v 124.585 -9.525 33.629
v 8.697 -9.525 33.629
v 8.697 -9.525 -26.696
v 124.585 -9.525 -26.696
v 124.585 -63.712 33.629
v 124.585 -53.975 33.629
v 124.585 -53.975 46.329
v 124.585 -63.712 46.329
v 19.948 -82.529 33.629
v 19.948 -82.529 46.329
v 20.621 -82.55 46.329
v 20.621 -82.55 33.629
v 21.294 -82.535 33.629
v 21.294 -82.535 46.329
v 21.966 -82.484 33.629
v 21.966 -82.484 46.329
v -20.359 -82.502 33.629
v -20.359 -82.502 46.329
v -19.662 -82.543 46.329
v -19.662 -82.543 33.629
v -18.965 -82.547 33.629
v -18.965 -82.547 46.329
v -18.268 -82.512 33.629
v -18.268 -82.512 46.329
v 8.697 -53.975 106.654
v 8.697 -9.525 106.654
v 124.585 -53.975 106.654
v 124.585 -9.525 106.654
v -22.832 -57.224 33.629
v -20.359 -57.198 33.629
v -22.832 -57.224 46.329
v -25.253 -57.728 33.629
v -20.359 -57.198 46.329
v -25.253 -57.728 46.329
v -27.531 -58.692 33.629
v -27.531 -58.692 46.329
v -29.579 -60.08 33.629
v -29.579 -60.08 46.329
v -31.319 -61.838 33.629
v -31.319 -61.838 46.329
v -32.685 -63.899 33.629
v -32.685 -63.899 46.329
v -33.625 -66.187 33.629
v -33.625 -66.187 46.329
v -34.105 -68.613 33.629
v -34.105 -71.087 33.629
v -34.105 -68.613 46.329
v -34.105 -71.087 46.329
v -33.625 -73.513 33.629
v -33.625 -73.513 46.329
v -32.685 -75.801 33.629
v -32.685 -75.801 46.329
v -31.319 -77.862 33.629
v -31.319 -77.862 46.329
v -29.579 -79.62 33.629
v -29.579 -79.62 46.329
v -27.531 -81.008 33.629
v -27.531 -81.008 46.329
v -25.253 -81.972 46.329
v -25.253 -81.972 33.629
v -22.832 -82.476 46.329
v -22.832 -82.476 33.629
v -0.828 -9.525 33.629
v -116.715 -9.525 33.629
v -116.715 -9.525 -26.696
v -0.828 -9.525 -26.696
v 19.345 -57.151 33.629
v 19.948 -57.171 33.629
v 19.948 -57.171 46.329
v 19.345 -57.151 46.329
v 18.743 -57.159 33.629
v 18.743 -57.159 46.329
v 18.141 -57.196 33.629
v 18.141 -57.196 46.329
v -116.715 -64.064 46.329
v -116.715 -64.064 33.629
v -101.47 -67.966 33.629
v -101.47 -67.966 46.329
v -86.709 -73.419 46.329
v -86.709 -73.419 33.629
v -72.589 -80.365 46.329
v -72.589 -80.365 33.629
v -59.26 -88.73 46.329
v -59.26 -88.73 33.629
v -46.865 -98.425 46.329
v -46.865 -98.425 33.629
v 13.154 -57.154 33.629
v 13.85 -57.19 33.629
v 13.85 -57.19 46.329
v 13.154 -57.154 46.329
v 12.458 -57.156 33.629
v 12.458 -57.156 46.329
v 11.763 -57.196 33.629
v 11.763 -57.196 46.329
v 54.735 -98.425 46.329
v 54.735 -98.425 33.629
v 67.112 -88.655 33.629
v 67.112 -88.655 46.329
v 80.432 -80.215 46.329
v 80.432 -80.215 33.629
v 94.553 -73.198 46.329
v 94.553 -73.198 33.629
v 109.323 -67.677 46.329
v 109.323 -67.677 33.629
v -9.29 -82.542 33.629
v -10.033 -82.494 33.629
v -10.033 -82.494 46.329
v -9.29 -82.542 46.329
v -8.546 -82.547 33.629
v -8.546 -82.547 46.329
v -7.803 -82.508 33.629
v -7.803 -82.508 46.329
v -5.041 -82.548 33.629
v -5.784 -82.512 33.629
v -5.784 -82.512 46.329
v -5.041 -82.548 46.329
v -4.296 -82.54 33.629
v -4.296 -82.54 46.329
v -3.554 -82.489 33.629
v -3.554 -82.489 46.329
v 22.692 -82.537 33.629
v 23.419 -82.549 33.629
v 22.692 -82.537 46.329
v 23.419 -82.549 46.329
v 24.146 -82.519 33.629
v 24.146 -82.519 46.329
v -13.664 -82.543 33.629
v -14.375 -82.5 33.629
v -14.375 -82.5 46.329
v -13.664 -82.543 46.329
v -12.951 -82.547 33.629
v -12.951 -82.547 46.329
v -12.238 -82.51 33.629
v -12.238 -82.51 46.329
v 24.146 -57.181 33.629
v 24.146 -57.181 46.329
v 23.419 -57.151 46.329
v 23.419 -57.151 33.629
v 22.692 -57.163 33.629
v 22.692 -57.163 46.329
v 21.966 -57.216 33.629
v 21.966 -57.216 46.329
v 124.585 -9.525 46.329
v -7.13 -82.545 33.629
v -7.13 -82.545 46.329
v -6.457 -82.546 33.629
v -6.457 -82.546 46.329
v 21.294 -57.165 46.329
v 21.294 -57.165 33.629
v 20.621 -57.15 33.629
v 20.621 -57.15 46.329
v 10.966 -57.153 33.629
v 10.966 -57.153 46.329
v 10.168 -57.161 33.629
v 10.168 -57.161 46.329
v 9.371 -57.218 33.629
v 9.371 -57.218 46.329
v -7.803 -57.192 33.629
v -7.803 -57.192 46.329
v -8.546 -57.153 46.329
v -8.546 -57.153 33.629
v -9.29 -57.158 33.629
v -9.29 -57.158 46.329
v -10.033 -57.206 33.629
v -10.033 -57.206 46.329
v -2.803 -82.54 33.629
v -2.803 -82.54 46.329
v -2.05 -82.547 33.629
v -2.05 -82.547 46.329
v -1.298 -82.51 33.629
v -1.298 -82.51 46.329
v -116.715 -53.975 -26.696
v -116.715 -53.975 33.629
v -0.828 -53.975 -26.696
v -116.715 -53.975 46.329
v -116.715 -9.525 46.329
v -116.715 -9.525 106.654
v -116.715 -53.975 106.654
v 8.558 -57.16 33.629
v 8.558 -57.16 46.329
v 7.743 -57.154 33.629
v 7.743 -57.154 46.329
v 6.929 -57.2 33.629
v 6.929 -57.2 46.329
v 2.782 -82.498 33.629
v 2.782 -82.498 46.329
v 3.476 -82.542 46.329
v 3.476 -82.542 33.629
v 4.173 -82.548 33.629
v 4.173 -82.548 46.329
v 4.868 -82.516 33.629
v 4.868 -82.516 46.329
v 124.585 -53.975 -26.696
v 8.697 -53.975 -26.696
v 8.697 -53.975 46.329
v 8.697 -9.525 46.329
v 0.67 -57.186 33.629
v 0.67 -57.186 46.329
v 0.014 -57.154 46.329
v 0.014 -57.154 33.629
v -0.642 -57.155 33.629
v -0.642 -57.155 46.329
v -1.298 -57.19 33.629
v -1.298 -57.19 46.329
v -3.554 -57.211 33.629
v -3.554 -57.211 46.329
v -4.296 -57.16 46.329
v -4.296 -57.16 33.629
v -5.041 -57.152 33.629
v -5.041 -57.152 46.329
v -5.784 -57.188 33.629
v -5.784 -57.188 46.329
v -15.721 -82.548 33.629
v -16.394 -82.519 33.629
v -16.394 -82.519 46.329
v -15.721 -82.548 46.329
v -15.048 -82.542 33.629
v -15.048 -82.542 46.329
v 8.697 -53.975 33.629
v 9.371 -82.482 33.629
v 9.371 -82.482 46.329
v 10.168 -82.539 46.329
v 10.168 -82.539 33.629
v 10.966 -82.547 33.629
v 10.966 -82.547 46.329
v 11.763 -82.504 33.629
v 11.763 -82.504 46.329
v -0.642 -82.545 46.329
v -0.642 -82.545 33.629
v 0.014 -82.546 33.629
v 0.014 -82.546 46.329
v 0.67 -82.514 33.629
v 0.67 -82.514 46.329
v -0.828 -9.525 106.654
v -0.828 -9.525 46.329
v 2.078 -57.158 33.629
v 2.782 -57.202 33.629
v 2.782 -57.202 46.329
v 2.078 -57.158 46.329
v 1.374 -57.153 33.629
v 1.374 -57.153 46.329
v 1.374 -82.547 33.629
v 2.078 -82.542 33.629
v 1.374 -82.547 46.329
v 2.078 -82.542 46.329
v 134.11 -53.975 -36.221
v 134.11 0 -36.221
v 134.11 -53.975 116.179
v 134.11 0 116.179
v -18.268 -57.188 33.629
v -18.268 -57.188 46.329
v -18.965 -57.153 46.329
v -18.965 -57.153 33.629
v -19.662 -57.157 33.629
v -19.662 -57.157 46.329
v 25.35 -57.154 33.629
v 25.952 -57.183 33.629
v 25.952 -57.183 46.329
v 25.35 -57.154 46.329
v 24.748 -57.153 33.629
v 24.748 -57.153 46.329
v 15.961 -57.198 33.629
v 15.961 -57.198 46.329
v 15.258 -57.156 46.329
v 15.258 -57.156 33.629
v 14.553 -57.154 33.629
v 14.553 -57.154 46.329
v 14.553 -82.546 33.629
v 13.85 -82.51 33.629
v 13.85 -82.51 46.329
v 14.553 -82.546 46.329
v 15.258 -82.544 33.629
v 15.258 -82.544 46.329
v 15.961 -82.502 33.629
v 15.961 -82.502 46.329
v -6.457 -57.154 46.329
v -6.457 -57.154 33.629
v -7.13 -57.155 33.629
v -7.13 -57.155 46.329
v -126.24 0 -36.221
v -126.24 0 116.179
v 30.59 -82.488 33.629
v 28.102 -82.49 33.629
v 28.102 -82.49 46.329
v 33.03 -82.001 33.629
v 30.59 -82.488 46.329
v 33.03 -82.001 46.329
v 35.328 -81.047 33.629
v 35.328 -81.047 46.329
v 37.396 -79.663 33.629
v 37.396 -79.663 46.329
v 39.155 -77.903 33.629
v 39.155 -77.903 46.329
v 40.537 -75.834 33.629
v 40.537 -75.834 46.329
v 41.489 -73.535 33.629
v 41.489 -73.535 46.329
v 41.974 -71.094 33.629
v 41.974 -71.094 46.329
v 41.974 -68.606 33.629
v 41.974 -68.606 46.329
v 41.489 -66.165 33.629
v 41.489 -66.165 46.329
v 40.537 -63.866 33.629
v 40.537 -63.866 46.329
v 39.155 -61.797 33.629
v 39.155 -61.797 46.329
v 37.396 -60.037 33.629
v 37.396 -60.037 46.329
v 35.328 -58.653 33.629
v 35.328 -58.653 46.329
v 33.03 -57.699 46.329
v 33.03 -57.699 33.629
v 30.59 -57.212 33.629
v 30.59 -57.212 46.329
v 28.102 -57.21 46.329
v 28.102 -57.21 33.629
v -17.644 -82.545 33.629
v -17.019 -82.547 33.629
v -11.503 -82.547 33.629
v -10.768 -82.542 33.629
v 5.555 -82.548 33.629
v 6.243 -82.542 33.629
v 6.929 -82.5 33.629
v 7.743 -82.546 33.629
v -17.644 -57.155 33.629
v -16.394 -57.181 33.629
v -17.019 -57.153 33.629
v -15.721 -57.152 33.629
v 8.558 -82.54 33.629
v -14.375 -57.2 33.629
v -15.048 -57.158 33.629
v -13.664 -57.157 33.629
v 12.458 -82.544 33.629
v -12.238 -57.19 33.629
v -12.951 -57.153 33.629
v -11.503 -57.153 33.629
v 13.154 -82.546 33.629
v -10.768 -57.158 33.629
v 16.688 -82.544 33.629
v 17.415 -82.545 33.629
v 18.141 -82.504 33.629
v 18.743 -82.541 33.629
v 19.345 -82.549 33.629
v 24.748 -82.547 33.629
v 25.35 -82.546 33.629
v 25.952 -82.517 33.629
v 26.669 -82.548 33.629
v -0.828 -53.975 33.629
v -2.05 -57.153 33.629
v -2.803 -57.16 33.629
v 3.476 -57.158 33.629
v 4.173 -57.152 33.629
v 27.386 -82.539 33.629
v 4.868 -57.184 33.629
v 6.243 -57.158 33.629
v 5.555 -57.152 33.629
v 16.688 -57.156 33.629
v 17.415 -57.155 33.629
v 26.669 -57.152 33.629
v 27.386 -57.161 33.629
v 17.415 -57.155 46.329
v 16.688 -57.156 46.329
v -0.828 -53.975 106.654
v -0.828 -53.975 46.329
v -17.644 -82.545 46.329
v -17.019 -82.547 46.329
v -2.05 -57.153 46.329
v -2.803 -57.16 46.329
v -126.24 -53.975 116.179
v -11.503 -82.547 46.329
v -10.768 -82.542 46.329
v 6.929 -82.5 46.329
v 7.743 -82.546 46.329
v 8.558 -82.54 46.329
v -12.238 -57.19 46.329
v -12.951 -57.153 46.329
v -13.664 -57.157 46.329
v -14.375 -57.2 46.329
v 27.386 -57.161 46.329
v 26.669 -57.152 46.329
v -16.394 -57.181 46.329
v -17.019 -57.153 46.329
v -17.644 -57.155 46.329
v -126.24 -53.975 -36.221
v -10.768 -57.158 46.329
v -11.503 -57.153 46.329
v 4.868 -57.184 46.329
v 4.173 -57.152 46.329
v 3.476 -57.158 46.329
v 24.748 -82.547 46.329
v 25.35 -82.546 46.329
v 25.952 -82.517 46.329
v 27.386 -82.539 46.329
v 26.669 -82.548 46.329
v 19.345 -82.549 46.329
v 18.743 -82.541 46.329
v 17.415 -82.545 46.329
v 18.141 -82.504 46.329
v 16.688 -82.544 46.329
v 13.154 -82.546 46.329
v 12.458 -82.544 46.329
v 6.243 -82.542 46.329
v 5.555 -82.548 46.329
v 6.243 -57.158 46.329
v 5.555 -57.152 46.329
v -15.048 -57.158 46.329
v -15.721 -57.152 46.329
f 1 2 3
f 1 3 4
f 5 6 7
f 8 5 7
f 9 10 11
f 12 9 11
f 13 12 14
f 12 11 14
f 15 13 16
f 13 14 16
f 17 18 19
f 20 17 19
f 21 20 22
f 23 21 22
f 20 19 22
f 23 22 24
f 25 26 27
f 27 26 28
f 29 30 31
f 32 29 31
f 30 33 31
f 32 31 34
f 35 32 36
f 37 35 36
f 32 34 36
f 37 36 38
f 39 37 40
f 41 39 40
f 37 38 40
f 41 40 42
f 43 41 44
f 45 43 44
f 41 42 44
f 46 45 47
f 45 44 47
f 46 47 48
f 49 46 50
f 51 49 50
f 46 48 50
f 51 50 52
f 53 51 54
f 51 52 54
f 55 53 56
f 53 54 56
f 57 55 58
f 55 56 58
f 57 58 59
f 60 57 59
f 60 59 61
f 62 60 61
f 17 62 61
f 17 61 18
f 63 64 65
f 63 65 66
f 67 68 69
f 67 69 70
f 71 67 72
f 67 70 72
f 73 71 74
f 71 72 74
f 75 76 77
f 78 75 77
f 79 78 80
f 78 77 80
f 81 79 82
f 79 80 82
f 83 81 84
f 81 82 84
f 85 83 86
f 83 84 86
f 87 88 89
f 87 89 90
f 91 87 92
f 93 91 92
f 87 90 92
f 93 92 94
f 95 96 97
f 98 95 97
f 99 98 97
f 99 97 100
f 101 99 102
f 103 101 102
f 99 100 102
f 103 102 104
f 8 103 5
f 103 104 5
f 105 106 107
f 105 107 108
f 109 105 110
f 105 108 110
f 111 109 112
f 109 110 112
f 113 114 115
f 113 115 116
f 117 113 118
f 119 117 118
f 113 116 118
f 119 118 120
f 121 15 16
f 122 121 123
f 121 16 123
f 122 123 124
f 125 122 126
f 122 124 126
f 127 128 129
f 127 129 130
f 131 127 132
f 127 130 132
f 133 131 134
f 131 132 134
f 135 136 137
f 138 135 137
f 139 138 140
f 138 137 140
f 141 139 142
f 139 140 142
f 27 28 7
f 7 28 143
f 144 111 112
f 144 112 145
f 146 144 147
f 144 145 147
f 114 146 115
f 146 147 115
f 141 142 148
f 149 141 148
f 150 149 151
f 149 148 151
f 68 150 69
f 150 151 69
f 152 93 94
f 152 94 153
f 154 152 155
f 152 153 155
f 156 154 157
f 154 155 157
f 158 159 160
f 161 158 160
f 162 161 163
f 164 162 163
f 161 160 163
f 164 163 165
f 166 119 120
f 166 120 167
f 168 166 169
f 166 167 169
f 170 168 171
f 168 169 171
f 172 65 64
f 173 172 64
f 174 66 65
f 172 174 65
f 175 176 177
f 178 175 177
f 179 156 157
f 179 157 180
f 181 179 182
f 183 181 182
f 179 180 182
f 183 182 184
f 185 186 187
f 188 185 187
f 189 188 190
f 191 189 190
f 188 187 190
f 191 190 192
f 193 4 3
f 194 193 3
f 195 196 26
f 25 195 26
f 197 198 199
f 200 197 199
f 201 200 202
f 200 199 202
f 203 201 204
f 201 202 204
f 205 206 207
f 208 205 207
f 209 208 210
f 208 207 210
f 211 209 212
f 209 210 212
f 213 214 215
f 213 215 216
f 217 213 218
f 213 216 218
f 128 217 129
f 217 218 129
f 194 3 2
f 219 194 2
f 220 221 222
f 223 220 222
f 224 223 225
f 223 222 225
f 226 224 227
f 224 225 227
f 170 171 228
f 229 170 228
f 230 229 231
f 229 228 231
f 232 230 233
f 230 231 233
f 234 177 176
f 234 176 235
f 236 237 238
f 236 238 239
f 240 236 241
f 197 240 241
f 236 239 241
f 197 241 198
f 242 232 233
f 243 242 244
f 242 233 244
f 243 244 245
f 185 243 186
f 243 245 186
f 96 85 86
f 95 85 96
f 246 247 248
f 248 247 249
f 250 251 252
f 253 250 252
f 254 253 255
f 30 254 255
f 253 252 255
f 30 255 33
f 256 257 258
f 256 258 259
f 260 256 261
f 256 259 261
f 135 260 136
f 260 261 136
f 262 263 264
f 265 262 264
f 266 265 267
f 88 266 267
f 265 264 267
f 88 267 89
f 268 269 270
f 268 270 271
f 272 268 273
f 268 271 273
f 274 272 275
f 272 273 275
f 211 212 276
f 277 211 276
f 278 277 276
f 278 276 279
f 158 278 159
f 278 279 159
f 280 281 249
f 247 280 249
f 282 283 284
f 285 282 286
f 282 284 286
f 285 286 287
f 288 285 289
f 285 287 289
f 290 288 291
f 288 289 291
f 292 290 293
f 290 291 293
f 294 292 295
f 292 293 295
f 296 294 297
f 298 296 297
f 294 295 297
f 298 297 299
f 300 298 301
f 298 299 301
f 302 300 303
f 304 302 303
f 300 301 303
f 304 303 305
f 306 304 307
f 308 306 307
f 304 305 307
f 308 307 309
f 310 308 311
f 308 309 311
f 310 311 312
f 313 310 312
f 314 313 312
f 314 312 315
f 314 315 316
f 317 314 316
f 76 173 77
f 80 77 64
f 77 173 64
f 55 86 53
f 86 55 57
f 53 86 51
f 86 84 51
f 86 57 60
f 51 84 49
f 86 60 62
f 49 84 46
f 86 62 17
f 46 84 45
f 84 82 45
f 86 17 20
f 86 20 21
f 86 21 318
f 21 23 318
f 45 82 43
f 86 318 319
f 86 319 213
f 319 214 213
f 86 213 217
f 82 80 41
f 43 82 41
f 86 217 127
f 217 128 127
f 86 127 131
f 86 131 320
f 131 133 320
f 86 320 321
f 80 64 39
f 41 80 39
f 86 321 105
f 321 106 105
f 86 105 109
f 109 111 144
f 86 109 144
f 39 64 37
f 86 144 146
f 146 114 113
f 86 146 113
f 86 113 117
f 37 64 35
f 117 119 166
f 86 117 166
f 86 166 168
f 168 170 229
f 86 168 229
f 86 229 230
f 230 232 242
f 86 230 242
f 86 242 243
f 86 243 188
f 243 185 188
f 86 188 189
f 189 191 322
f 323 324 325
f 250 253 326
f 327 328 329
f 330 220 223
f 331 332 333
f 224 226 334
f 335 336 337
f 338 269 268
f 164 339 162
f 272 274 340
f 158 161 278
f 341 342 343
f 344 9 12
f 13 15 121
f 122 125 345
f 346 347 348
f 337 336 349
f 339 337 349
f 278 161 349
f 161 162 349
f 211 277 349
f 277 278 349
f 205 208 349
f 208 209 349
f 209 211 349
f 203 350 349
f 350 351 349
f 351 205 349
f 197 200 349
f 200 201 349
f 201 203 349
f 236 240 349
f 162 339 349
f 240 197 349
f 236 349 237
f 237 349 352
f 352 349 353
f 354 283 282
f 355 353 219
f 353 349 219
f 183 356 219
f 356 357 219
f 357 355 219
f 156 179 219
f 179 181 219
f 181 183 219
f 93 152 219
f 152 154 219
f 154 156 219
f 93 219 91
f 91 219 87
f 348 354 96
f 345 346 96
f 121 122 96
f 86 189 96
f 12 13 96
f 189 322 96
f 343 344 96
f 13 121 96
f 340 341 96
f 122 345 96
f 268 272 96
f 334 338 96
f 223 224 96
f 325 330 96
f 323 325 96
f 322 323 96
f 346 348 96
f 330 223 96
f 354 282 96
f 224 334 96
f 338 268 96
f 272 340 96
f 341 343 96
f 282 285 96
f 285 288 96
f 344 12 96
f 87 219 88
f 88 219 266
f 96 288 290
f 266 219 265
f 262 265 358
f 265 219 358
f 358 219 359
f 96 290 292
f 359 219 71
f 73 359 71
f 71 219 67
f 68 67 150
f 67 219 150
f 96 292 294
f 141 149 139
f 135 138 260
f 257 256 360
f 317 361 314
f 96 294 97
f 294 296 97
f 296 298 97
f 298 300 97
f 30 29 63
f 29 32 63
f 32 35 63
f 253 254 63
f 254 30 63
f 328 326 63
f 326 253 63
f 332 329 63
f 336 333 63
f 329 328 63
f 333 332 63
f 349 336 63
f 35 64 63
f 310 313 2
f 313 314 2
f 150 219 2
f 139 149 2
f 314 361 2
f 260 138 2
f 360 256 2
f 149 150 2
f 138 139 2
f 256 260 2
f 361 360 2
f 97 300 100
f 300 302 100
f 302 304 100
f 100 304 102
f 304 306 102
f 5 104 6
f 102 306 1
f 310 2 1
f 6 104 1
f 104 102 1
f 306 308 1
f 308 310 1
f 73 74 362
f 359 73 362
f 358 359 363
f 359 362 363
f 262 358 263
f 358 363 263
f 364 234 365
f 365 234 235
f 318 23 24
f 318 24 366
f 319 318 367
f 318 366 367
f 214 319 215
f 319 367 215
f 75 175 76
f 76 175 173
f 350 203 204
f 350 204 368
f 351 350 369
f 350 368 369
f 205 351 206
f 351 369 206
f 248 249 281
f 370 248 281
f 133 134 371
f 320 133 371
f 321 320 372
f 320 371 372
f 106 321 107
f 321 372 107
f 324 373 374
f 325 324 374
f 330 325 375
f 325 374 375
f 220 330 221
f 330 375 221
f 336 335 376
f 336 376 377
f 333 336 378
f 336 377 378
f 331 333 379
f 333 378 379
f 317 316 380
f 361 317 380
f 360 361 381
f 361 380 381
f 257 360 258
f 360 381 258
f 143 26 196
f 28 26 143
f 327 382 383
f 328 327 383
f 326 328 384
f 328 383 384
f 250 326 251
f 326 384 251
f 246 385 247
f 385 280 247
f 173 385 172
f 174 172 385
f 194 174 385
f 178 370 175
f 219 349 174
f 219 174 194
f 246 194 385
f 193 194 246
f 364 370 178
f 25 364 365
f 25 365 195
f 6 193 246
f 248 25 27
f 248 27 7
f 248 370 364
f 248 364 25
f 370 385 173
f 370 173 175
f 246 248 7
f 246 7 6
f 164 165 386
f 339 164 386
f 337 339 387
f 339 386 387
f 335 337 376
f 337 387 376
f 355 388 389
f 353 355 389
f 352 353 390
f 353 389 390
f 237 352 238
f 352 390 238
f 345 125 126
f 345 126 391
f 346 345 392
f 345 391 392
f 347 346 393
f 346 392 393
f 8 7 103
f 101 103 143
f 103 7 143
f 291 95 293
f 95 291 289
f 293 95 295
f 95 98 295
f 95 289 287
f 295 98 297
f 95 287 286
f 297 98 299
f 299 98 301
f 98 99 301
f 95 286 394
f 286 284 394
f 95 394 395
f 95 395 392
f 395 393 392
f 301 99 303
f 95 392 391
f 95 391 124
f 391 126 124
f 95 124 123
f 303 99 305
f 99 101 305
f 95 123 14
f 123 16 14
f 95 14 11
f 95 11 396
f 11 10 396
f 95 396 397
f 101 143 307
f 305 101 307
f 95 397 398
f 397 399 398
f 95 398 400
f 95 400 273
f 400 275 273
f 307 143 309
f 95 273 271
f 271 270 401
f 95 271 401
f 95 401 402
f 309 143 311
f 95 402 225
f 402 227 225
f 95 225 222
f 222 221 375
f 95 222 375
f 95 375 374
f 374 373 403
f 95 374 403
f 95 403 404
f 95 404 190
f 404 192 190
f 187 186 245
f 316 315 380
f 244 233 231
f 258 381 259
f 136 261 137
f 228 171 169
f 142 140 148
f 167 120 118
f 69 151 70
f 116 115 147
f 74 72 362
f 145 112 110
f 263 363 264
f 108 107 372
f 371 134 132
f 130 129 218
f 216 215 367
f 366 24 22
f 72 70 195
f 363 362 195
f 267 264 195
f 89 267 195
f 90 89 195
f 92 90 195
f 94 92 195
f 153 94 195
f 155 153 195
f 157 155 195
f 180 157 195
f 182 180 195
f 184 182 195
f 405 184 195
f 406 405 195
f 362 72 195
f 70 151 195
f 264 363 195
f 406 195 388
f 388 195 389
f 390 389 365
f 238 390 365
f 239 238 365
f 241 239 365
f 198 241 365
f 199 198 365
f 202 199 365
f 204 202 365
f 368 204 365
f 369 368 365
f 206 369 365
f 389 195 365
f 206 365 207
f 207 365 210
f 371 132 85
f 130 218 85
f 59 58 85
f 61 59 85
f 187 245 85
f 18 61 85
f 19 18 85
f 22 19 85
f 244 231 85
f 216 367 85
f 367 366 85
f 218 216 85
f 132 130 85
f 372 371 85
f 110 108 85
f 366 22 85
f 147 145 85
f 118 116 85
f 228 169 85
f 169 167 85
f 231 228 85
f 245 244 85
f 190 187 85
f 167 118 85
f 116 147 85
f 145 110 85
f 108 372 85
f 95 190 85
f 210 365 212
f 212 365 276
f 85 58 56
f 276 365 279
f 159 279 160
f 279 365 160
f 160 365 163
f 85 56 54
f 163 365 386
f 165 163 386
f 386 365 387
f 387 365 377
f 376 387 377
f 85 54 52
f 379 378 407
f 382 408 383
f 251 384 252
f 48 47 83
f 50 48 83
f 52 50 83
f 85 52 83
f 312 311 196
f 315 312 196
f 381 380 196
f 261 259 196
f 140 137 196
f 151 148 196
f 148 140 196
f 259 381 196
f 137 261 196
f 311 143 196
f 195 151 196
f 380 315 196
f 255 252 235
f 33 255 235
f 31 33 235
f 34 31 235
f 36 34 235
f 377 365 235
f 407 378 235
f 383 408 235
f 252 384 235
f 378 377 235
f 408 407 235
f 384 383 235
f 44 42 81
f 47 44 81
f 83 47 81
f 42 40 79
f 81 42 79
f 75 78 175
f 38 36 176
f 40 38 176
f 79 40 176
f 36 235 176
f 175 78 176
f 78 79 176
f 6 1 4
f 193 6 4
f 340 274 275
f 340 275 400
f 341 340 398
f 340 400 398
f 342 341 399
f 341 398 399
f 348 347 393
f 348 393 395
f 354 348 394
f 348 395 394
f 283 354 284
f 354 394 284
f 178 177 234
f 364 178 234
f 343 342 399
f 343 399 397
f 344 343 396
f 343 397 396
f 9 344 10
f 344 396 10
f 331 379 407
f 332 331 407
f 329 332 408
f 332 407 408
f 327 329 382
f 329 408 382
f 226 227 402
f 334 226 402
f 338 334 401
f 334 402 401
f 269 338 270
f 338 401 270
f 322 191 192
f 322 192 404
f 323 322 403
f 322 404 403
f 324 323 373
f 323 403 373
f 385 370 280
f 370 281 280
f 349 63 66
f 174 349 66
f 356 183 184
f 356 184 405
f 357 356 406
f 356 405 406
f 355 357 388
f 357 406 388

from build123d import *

# Parameters (mm, degrees)
F0_W     = 260.35
F0_H     = 152.4
F1_DEPTH = 9.525
F3_DEPTH = 44.45
F5_DEPTH = 88.9
F7_D     = 25.4
F9_DEPTH = 25.4


with BuildPart() as f1:
    # F0 (on Front) → F1 (new body)
    with BuildSketch(Plane.XZ):
        with Locations((3.93492, 39.978574)):
            Rectangle(F0_W, F0_H)
    extrude(amount=F1_DEPTH)

    # F2 (on face) → F3 (join)
    with BuildSketch(Plane.XZ.offset(9.525)):
        Polygon((-126.24008, 106.653574), (-126.24008, -26.696426), (-116.71508, -26.696426), (-116.71508, 49.017824), (-116.71508, 106.653574), align=None)
        Polygon((124.58492, 106.653574), (134.10992, 106.653574), (134.10992, 116.178574), (-126.24008, 116.178574), (-126.24008, 106.653574), (-116.71508, 106.653574), (-0.82758, 106.653574), (8.69742, 106.653574), align=None)
        Polygon((-0.82758, -26.696426), (8.69742, -26.696426), (8.69742, 55.01255), (8.69742, 106.653574), (-0.82758, 106.653574), (-0.82758, 77.835699), align=None)
        Polygon((124.58492, -26.696426), (134.10992, -26.696426), (134.10992, 106.653574), (124.58492, 106.653574), (124.58492, 65.446369), align=None)
        Polygon((-126.24008, -36.221426), (134.10992, -36.221426), (134.10992, -26.696426), (124.58492, -26.696426), (8.69742, -26.696426), (-0.82758, -26.696426), (-116.71508, -26.696426), (-126.24008, -26.696426), align=None)
    extrude(amount=F3_DEPTH)

    # F4 (on face) → F5 (join)
    with BuildSketch(Plane.XZ.offset(9.525)):
        Polygon((-116.71508, 33.628574), (38.57762, 33.628574), (124.58492, 33.628574), (124.58492, 46.328574), (37.81344, 46.328574), (-4.043767, 46.328574), (-116.71508, 46.328574), align=None)
    extrude(amount=F5_DEPTH)

    # F7 (through all)
    with Locations(Plane(origin=(0, 0, 33.628574), x_dir=(1, 0, 0), z_dir=(0, 0, -1))):
        with Locations((-21.46508, 69.85), (-19.252239, 69.85), (-17.284498, 69.85), (-15.503385, 69.85), (-13.247554, 69.85), (-11.229082, 69.85), (-8.837353, 69.85), (-6.768152, 69.85), (-4.800411, 69.85), (-2.307222, 69.85), (-0.28875, 69.85), (1.628261, 69.85), (3.93492, 69.85), (5.801102, 69.85), (8.056932, 69.85), (10.68602, 69.85), (12.840387, 69.85), (14.85886, 69.85), (17.06396, 69.85), (19.218329, 69.85), (20.676916, 69.85), (23.255272, 69.85), (25.036385, 69.85), (26.868232, 69.85), (29.33492, 69.85)):
            Hole(F7_D / 2)

    # F8 (on face) → F9 (cut)
    with BuildSketch(Plane(origin=(0, 0, 33.628574), x_dir=(1, 0, 0), z_dir=(0, 0, -1))):
        with BuildLine():
            Line((-116.71508, 98.425), (-116.71508, 64.064013))
            ThreePointArc((-116.71508, 64.064013), (-79.559192, 76.709492), (-46.86508, 98.425))
            Line((-46.86508, 98.425), (-116.71508, 98.425))
        make_face()
        with BuildLine():
            Line((124.58492, 98.425), (54.73492, 98.425))
            ThreePointArc((54.73492, 98.425), (87.401467, 76.523831), (124.58492, 63.711519))
            Line((124.58492, 63.711519), (124.58492, 98.425))
        make_face()
    extrude(amount=-F9_DEPTH, mode=Mode.SUBTRACT)


solid = f1.part
